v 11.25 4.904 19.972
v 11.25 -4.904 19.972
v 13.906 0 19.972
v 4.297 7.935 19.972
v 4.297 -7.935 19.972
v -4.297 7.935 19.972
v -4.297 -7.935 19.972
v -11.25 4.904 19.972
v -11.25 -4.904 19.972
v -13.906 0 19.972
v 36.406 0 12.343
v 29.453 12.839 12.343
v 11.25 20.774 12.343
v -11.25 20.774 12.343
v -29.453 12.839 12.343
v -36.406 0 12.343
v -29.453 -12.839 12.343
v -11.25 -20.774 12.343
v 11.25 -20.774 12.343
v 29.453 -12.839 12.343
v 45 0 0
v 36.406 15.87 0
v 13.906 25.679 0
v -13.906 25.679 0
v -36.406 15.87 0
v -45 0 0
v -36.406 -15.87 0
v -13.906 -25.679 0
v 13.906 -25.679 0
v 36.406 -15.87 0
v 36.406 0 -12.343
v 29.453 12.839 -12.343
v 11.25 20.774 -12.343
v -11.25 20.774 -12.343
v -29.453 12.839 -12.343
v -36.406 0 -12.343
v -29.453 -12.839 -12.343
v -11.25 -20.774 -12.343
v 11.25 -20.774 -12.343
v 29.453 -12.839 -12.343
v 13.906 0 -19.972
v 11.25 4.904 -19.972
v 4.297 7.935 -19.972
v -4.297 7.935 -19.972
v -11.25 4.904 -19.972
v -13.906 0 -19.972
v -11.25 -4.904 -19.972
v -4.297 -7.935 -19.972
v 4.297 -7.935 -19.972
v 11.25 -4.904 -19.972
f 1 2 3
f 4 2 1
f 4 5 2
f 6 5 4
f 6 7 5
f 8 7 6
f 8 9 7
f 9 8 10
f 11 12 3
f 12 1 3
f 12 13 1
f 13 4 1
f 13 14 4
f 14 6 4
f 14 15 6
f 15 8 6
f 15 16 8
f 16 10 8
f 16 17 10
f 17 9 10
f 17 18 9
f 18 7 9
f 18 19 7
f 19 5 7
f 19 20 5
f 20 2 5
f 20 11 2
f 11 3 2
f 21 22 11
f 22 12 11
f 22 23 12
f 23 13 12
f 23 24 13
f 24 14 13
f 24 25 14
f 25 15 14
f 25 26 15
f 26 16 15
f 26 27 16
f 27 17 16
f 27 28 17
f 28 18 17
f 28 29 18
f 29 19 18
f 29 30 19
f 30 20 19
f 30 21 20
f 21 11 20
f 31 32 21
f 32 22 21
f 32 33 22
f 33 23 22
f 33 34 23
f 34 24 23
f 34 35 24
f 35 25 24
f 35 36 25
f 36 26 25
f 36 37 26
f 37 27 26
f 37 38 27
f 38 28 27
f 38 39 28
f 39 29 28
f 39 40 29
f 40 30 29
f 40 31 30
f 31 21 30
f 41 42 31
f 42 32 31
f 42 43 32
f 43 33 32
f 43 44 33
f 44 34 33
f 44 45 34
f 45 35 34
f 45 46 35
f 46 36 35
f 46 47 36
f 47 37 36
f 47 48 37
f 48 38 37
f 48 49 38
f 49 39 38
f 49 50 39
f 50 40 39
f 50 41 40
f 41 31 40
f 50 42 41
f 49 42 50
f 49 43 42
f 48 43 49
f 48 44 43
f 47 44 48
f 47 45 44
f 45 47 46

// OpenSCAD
// Generated by SolidPython 1.0.1 on 2020-07-29 00:46:52


scale(v = [15, 9, 7]) {
	sphere(r = 3);
}
/***********************************************
*********      SolidPython code:      **********
************************************************
 
# import packages: SolidPython
from solid import *
from solid.utils import *
from itertools import chain, combinations, permutations


class Resize:

    def __init__(self, scad_file):
        self.scad_file = scad_file
        #self.scad_file = import_scad(scad_file)
        # cone/cylinder param:
        self.r1 = 0
        self.r2 = 0
        self.h = 0
        # rectangular prism param:
        self.w = 0
        self.l = 0
        # ellipse param:
        self.r = 0

    # import OpenScad code (file name corresponds to shape)


    # classify shape + parameters
    def assign(self, param1, param2, param3):
        if self.scad_file == 'cone.scad':
            self.r1 = param1
            self.r2 = param2
            self.h = param3
        elif self.scad_file == 'cylinder.scad':
            self.r1 = param1
            self.r2 = param2
            self.h = param3
        elif self.scad_file == 'rectangularPrism.scad':
            self.h = param1
            self.l = param2
            self.w = param3
        else:
            self.r = param1
            self.h = param2

    # resize parameters
    def iterate(self):
        x = range(3, 20, 2)
        i = 1
        if self.scad_file == 'cone.scad':
            tempList = list(permutations(x, 2))
            for temp in tempList:
                param1 = temp[0]
                param2 = temp[1]
                filepath = 'produced_scad_files/' + 'cone' + str(param1) + '_' + str(param2) + '_' + '.scad'
                scad_render_to_file(cylinder(h=param1, r1=param2, r2=0), filepath)

        elif self.scad_file == 'cylinder.scad':
            tempList = list(permutations(x, 3))
            for temp in tempList:
                param1 = temp[0]
                param2 = temp[1]
                filepath = 'produced_scad_files/' + 'cylinder' + str(param1) + '_' + str(param2) + '_' + '.scad'
                scad_render_to_file(cylinder(h=param1, r1=param2, r2=param2), filepath)

        elif self.scad_file == 'rectangularPrism.scad':
            tempList = list(permutations(x, 3))
            for temp in tempList:
                param1 = temp[0]
                param2 = temp[1]
                param3 = temp[2]
                filepath = 'produced_scad_files/' + 'rectangularPrism' + str(param1) + '_' + str(param2) + '_' + str(
                    param3) + '.scad'
                scad_render_to_file(cube(size=(param1, param2, param3)), filepath)

        elif self.scad_file == 'ellipse.scad':
            tempList = list(permutations(x, 4))
            for temp in tempList:
                param1 = temp[0]
                param2 = temp[1]
                param3 = temp[2]
                param4 = temp[3]
                filepath = 'produced_scad_files/' + 'ellipse' + str(param1) + '_' + str(param2) + '_' + str(param3) + '_' + str(param4) + '.scad'
                scad_render_to_file(scale([param1, param2, param3])(sphere(r=param4)), filepath)

    def render_to_scadfile(self):
        scad_render_to_file(scad, 'example.scad') 
 
************************************************/
